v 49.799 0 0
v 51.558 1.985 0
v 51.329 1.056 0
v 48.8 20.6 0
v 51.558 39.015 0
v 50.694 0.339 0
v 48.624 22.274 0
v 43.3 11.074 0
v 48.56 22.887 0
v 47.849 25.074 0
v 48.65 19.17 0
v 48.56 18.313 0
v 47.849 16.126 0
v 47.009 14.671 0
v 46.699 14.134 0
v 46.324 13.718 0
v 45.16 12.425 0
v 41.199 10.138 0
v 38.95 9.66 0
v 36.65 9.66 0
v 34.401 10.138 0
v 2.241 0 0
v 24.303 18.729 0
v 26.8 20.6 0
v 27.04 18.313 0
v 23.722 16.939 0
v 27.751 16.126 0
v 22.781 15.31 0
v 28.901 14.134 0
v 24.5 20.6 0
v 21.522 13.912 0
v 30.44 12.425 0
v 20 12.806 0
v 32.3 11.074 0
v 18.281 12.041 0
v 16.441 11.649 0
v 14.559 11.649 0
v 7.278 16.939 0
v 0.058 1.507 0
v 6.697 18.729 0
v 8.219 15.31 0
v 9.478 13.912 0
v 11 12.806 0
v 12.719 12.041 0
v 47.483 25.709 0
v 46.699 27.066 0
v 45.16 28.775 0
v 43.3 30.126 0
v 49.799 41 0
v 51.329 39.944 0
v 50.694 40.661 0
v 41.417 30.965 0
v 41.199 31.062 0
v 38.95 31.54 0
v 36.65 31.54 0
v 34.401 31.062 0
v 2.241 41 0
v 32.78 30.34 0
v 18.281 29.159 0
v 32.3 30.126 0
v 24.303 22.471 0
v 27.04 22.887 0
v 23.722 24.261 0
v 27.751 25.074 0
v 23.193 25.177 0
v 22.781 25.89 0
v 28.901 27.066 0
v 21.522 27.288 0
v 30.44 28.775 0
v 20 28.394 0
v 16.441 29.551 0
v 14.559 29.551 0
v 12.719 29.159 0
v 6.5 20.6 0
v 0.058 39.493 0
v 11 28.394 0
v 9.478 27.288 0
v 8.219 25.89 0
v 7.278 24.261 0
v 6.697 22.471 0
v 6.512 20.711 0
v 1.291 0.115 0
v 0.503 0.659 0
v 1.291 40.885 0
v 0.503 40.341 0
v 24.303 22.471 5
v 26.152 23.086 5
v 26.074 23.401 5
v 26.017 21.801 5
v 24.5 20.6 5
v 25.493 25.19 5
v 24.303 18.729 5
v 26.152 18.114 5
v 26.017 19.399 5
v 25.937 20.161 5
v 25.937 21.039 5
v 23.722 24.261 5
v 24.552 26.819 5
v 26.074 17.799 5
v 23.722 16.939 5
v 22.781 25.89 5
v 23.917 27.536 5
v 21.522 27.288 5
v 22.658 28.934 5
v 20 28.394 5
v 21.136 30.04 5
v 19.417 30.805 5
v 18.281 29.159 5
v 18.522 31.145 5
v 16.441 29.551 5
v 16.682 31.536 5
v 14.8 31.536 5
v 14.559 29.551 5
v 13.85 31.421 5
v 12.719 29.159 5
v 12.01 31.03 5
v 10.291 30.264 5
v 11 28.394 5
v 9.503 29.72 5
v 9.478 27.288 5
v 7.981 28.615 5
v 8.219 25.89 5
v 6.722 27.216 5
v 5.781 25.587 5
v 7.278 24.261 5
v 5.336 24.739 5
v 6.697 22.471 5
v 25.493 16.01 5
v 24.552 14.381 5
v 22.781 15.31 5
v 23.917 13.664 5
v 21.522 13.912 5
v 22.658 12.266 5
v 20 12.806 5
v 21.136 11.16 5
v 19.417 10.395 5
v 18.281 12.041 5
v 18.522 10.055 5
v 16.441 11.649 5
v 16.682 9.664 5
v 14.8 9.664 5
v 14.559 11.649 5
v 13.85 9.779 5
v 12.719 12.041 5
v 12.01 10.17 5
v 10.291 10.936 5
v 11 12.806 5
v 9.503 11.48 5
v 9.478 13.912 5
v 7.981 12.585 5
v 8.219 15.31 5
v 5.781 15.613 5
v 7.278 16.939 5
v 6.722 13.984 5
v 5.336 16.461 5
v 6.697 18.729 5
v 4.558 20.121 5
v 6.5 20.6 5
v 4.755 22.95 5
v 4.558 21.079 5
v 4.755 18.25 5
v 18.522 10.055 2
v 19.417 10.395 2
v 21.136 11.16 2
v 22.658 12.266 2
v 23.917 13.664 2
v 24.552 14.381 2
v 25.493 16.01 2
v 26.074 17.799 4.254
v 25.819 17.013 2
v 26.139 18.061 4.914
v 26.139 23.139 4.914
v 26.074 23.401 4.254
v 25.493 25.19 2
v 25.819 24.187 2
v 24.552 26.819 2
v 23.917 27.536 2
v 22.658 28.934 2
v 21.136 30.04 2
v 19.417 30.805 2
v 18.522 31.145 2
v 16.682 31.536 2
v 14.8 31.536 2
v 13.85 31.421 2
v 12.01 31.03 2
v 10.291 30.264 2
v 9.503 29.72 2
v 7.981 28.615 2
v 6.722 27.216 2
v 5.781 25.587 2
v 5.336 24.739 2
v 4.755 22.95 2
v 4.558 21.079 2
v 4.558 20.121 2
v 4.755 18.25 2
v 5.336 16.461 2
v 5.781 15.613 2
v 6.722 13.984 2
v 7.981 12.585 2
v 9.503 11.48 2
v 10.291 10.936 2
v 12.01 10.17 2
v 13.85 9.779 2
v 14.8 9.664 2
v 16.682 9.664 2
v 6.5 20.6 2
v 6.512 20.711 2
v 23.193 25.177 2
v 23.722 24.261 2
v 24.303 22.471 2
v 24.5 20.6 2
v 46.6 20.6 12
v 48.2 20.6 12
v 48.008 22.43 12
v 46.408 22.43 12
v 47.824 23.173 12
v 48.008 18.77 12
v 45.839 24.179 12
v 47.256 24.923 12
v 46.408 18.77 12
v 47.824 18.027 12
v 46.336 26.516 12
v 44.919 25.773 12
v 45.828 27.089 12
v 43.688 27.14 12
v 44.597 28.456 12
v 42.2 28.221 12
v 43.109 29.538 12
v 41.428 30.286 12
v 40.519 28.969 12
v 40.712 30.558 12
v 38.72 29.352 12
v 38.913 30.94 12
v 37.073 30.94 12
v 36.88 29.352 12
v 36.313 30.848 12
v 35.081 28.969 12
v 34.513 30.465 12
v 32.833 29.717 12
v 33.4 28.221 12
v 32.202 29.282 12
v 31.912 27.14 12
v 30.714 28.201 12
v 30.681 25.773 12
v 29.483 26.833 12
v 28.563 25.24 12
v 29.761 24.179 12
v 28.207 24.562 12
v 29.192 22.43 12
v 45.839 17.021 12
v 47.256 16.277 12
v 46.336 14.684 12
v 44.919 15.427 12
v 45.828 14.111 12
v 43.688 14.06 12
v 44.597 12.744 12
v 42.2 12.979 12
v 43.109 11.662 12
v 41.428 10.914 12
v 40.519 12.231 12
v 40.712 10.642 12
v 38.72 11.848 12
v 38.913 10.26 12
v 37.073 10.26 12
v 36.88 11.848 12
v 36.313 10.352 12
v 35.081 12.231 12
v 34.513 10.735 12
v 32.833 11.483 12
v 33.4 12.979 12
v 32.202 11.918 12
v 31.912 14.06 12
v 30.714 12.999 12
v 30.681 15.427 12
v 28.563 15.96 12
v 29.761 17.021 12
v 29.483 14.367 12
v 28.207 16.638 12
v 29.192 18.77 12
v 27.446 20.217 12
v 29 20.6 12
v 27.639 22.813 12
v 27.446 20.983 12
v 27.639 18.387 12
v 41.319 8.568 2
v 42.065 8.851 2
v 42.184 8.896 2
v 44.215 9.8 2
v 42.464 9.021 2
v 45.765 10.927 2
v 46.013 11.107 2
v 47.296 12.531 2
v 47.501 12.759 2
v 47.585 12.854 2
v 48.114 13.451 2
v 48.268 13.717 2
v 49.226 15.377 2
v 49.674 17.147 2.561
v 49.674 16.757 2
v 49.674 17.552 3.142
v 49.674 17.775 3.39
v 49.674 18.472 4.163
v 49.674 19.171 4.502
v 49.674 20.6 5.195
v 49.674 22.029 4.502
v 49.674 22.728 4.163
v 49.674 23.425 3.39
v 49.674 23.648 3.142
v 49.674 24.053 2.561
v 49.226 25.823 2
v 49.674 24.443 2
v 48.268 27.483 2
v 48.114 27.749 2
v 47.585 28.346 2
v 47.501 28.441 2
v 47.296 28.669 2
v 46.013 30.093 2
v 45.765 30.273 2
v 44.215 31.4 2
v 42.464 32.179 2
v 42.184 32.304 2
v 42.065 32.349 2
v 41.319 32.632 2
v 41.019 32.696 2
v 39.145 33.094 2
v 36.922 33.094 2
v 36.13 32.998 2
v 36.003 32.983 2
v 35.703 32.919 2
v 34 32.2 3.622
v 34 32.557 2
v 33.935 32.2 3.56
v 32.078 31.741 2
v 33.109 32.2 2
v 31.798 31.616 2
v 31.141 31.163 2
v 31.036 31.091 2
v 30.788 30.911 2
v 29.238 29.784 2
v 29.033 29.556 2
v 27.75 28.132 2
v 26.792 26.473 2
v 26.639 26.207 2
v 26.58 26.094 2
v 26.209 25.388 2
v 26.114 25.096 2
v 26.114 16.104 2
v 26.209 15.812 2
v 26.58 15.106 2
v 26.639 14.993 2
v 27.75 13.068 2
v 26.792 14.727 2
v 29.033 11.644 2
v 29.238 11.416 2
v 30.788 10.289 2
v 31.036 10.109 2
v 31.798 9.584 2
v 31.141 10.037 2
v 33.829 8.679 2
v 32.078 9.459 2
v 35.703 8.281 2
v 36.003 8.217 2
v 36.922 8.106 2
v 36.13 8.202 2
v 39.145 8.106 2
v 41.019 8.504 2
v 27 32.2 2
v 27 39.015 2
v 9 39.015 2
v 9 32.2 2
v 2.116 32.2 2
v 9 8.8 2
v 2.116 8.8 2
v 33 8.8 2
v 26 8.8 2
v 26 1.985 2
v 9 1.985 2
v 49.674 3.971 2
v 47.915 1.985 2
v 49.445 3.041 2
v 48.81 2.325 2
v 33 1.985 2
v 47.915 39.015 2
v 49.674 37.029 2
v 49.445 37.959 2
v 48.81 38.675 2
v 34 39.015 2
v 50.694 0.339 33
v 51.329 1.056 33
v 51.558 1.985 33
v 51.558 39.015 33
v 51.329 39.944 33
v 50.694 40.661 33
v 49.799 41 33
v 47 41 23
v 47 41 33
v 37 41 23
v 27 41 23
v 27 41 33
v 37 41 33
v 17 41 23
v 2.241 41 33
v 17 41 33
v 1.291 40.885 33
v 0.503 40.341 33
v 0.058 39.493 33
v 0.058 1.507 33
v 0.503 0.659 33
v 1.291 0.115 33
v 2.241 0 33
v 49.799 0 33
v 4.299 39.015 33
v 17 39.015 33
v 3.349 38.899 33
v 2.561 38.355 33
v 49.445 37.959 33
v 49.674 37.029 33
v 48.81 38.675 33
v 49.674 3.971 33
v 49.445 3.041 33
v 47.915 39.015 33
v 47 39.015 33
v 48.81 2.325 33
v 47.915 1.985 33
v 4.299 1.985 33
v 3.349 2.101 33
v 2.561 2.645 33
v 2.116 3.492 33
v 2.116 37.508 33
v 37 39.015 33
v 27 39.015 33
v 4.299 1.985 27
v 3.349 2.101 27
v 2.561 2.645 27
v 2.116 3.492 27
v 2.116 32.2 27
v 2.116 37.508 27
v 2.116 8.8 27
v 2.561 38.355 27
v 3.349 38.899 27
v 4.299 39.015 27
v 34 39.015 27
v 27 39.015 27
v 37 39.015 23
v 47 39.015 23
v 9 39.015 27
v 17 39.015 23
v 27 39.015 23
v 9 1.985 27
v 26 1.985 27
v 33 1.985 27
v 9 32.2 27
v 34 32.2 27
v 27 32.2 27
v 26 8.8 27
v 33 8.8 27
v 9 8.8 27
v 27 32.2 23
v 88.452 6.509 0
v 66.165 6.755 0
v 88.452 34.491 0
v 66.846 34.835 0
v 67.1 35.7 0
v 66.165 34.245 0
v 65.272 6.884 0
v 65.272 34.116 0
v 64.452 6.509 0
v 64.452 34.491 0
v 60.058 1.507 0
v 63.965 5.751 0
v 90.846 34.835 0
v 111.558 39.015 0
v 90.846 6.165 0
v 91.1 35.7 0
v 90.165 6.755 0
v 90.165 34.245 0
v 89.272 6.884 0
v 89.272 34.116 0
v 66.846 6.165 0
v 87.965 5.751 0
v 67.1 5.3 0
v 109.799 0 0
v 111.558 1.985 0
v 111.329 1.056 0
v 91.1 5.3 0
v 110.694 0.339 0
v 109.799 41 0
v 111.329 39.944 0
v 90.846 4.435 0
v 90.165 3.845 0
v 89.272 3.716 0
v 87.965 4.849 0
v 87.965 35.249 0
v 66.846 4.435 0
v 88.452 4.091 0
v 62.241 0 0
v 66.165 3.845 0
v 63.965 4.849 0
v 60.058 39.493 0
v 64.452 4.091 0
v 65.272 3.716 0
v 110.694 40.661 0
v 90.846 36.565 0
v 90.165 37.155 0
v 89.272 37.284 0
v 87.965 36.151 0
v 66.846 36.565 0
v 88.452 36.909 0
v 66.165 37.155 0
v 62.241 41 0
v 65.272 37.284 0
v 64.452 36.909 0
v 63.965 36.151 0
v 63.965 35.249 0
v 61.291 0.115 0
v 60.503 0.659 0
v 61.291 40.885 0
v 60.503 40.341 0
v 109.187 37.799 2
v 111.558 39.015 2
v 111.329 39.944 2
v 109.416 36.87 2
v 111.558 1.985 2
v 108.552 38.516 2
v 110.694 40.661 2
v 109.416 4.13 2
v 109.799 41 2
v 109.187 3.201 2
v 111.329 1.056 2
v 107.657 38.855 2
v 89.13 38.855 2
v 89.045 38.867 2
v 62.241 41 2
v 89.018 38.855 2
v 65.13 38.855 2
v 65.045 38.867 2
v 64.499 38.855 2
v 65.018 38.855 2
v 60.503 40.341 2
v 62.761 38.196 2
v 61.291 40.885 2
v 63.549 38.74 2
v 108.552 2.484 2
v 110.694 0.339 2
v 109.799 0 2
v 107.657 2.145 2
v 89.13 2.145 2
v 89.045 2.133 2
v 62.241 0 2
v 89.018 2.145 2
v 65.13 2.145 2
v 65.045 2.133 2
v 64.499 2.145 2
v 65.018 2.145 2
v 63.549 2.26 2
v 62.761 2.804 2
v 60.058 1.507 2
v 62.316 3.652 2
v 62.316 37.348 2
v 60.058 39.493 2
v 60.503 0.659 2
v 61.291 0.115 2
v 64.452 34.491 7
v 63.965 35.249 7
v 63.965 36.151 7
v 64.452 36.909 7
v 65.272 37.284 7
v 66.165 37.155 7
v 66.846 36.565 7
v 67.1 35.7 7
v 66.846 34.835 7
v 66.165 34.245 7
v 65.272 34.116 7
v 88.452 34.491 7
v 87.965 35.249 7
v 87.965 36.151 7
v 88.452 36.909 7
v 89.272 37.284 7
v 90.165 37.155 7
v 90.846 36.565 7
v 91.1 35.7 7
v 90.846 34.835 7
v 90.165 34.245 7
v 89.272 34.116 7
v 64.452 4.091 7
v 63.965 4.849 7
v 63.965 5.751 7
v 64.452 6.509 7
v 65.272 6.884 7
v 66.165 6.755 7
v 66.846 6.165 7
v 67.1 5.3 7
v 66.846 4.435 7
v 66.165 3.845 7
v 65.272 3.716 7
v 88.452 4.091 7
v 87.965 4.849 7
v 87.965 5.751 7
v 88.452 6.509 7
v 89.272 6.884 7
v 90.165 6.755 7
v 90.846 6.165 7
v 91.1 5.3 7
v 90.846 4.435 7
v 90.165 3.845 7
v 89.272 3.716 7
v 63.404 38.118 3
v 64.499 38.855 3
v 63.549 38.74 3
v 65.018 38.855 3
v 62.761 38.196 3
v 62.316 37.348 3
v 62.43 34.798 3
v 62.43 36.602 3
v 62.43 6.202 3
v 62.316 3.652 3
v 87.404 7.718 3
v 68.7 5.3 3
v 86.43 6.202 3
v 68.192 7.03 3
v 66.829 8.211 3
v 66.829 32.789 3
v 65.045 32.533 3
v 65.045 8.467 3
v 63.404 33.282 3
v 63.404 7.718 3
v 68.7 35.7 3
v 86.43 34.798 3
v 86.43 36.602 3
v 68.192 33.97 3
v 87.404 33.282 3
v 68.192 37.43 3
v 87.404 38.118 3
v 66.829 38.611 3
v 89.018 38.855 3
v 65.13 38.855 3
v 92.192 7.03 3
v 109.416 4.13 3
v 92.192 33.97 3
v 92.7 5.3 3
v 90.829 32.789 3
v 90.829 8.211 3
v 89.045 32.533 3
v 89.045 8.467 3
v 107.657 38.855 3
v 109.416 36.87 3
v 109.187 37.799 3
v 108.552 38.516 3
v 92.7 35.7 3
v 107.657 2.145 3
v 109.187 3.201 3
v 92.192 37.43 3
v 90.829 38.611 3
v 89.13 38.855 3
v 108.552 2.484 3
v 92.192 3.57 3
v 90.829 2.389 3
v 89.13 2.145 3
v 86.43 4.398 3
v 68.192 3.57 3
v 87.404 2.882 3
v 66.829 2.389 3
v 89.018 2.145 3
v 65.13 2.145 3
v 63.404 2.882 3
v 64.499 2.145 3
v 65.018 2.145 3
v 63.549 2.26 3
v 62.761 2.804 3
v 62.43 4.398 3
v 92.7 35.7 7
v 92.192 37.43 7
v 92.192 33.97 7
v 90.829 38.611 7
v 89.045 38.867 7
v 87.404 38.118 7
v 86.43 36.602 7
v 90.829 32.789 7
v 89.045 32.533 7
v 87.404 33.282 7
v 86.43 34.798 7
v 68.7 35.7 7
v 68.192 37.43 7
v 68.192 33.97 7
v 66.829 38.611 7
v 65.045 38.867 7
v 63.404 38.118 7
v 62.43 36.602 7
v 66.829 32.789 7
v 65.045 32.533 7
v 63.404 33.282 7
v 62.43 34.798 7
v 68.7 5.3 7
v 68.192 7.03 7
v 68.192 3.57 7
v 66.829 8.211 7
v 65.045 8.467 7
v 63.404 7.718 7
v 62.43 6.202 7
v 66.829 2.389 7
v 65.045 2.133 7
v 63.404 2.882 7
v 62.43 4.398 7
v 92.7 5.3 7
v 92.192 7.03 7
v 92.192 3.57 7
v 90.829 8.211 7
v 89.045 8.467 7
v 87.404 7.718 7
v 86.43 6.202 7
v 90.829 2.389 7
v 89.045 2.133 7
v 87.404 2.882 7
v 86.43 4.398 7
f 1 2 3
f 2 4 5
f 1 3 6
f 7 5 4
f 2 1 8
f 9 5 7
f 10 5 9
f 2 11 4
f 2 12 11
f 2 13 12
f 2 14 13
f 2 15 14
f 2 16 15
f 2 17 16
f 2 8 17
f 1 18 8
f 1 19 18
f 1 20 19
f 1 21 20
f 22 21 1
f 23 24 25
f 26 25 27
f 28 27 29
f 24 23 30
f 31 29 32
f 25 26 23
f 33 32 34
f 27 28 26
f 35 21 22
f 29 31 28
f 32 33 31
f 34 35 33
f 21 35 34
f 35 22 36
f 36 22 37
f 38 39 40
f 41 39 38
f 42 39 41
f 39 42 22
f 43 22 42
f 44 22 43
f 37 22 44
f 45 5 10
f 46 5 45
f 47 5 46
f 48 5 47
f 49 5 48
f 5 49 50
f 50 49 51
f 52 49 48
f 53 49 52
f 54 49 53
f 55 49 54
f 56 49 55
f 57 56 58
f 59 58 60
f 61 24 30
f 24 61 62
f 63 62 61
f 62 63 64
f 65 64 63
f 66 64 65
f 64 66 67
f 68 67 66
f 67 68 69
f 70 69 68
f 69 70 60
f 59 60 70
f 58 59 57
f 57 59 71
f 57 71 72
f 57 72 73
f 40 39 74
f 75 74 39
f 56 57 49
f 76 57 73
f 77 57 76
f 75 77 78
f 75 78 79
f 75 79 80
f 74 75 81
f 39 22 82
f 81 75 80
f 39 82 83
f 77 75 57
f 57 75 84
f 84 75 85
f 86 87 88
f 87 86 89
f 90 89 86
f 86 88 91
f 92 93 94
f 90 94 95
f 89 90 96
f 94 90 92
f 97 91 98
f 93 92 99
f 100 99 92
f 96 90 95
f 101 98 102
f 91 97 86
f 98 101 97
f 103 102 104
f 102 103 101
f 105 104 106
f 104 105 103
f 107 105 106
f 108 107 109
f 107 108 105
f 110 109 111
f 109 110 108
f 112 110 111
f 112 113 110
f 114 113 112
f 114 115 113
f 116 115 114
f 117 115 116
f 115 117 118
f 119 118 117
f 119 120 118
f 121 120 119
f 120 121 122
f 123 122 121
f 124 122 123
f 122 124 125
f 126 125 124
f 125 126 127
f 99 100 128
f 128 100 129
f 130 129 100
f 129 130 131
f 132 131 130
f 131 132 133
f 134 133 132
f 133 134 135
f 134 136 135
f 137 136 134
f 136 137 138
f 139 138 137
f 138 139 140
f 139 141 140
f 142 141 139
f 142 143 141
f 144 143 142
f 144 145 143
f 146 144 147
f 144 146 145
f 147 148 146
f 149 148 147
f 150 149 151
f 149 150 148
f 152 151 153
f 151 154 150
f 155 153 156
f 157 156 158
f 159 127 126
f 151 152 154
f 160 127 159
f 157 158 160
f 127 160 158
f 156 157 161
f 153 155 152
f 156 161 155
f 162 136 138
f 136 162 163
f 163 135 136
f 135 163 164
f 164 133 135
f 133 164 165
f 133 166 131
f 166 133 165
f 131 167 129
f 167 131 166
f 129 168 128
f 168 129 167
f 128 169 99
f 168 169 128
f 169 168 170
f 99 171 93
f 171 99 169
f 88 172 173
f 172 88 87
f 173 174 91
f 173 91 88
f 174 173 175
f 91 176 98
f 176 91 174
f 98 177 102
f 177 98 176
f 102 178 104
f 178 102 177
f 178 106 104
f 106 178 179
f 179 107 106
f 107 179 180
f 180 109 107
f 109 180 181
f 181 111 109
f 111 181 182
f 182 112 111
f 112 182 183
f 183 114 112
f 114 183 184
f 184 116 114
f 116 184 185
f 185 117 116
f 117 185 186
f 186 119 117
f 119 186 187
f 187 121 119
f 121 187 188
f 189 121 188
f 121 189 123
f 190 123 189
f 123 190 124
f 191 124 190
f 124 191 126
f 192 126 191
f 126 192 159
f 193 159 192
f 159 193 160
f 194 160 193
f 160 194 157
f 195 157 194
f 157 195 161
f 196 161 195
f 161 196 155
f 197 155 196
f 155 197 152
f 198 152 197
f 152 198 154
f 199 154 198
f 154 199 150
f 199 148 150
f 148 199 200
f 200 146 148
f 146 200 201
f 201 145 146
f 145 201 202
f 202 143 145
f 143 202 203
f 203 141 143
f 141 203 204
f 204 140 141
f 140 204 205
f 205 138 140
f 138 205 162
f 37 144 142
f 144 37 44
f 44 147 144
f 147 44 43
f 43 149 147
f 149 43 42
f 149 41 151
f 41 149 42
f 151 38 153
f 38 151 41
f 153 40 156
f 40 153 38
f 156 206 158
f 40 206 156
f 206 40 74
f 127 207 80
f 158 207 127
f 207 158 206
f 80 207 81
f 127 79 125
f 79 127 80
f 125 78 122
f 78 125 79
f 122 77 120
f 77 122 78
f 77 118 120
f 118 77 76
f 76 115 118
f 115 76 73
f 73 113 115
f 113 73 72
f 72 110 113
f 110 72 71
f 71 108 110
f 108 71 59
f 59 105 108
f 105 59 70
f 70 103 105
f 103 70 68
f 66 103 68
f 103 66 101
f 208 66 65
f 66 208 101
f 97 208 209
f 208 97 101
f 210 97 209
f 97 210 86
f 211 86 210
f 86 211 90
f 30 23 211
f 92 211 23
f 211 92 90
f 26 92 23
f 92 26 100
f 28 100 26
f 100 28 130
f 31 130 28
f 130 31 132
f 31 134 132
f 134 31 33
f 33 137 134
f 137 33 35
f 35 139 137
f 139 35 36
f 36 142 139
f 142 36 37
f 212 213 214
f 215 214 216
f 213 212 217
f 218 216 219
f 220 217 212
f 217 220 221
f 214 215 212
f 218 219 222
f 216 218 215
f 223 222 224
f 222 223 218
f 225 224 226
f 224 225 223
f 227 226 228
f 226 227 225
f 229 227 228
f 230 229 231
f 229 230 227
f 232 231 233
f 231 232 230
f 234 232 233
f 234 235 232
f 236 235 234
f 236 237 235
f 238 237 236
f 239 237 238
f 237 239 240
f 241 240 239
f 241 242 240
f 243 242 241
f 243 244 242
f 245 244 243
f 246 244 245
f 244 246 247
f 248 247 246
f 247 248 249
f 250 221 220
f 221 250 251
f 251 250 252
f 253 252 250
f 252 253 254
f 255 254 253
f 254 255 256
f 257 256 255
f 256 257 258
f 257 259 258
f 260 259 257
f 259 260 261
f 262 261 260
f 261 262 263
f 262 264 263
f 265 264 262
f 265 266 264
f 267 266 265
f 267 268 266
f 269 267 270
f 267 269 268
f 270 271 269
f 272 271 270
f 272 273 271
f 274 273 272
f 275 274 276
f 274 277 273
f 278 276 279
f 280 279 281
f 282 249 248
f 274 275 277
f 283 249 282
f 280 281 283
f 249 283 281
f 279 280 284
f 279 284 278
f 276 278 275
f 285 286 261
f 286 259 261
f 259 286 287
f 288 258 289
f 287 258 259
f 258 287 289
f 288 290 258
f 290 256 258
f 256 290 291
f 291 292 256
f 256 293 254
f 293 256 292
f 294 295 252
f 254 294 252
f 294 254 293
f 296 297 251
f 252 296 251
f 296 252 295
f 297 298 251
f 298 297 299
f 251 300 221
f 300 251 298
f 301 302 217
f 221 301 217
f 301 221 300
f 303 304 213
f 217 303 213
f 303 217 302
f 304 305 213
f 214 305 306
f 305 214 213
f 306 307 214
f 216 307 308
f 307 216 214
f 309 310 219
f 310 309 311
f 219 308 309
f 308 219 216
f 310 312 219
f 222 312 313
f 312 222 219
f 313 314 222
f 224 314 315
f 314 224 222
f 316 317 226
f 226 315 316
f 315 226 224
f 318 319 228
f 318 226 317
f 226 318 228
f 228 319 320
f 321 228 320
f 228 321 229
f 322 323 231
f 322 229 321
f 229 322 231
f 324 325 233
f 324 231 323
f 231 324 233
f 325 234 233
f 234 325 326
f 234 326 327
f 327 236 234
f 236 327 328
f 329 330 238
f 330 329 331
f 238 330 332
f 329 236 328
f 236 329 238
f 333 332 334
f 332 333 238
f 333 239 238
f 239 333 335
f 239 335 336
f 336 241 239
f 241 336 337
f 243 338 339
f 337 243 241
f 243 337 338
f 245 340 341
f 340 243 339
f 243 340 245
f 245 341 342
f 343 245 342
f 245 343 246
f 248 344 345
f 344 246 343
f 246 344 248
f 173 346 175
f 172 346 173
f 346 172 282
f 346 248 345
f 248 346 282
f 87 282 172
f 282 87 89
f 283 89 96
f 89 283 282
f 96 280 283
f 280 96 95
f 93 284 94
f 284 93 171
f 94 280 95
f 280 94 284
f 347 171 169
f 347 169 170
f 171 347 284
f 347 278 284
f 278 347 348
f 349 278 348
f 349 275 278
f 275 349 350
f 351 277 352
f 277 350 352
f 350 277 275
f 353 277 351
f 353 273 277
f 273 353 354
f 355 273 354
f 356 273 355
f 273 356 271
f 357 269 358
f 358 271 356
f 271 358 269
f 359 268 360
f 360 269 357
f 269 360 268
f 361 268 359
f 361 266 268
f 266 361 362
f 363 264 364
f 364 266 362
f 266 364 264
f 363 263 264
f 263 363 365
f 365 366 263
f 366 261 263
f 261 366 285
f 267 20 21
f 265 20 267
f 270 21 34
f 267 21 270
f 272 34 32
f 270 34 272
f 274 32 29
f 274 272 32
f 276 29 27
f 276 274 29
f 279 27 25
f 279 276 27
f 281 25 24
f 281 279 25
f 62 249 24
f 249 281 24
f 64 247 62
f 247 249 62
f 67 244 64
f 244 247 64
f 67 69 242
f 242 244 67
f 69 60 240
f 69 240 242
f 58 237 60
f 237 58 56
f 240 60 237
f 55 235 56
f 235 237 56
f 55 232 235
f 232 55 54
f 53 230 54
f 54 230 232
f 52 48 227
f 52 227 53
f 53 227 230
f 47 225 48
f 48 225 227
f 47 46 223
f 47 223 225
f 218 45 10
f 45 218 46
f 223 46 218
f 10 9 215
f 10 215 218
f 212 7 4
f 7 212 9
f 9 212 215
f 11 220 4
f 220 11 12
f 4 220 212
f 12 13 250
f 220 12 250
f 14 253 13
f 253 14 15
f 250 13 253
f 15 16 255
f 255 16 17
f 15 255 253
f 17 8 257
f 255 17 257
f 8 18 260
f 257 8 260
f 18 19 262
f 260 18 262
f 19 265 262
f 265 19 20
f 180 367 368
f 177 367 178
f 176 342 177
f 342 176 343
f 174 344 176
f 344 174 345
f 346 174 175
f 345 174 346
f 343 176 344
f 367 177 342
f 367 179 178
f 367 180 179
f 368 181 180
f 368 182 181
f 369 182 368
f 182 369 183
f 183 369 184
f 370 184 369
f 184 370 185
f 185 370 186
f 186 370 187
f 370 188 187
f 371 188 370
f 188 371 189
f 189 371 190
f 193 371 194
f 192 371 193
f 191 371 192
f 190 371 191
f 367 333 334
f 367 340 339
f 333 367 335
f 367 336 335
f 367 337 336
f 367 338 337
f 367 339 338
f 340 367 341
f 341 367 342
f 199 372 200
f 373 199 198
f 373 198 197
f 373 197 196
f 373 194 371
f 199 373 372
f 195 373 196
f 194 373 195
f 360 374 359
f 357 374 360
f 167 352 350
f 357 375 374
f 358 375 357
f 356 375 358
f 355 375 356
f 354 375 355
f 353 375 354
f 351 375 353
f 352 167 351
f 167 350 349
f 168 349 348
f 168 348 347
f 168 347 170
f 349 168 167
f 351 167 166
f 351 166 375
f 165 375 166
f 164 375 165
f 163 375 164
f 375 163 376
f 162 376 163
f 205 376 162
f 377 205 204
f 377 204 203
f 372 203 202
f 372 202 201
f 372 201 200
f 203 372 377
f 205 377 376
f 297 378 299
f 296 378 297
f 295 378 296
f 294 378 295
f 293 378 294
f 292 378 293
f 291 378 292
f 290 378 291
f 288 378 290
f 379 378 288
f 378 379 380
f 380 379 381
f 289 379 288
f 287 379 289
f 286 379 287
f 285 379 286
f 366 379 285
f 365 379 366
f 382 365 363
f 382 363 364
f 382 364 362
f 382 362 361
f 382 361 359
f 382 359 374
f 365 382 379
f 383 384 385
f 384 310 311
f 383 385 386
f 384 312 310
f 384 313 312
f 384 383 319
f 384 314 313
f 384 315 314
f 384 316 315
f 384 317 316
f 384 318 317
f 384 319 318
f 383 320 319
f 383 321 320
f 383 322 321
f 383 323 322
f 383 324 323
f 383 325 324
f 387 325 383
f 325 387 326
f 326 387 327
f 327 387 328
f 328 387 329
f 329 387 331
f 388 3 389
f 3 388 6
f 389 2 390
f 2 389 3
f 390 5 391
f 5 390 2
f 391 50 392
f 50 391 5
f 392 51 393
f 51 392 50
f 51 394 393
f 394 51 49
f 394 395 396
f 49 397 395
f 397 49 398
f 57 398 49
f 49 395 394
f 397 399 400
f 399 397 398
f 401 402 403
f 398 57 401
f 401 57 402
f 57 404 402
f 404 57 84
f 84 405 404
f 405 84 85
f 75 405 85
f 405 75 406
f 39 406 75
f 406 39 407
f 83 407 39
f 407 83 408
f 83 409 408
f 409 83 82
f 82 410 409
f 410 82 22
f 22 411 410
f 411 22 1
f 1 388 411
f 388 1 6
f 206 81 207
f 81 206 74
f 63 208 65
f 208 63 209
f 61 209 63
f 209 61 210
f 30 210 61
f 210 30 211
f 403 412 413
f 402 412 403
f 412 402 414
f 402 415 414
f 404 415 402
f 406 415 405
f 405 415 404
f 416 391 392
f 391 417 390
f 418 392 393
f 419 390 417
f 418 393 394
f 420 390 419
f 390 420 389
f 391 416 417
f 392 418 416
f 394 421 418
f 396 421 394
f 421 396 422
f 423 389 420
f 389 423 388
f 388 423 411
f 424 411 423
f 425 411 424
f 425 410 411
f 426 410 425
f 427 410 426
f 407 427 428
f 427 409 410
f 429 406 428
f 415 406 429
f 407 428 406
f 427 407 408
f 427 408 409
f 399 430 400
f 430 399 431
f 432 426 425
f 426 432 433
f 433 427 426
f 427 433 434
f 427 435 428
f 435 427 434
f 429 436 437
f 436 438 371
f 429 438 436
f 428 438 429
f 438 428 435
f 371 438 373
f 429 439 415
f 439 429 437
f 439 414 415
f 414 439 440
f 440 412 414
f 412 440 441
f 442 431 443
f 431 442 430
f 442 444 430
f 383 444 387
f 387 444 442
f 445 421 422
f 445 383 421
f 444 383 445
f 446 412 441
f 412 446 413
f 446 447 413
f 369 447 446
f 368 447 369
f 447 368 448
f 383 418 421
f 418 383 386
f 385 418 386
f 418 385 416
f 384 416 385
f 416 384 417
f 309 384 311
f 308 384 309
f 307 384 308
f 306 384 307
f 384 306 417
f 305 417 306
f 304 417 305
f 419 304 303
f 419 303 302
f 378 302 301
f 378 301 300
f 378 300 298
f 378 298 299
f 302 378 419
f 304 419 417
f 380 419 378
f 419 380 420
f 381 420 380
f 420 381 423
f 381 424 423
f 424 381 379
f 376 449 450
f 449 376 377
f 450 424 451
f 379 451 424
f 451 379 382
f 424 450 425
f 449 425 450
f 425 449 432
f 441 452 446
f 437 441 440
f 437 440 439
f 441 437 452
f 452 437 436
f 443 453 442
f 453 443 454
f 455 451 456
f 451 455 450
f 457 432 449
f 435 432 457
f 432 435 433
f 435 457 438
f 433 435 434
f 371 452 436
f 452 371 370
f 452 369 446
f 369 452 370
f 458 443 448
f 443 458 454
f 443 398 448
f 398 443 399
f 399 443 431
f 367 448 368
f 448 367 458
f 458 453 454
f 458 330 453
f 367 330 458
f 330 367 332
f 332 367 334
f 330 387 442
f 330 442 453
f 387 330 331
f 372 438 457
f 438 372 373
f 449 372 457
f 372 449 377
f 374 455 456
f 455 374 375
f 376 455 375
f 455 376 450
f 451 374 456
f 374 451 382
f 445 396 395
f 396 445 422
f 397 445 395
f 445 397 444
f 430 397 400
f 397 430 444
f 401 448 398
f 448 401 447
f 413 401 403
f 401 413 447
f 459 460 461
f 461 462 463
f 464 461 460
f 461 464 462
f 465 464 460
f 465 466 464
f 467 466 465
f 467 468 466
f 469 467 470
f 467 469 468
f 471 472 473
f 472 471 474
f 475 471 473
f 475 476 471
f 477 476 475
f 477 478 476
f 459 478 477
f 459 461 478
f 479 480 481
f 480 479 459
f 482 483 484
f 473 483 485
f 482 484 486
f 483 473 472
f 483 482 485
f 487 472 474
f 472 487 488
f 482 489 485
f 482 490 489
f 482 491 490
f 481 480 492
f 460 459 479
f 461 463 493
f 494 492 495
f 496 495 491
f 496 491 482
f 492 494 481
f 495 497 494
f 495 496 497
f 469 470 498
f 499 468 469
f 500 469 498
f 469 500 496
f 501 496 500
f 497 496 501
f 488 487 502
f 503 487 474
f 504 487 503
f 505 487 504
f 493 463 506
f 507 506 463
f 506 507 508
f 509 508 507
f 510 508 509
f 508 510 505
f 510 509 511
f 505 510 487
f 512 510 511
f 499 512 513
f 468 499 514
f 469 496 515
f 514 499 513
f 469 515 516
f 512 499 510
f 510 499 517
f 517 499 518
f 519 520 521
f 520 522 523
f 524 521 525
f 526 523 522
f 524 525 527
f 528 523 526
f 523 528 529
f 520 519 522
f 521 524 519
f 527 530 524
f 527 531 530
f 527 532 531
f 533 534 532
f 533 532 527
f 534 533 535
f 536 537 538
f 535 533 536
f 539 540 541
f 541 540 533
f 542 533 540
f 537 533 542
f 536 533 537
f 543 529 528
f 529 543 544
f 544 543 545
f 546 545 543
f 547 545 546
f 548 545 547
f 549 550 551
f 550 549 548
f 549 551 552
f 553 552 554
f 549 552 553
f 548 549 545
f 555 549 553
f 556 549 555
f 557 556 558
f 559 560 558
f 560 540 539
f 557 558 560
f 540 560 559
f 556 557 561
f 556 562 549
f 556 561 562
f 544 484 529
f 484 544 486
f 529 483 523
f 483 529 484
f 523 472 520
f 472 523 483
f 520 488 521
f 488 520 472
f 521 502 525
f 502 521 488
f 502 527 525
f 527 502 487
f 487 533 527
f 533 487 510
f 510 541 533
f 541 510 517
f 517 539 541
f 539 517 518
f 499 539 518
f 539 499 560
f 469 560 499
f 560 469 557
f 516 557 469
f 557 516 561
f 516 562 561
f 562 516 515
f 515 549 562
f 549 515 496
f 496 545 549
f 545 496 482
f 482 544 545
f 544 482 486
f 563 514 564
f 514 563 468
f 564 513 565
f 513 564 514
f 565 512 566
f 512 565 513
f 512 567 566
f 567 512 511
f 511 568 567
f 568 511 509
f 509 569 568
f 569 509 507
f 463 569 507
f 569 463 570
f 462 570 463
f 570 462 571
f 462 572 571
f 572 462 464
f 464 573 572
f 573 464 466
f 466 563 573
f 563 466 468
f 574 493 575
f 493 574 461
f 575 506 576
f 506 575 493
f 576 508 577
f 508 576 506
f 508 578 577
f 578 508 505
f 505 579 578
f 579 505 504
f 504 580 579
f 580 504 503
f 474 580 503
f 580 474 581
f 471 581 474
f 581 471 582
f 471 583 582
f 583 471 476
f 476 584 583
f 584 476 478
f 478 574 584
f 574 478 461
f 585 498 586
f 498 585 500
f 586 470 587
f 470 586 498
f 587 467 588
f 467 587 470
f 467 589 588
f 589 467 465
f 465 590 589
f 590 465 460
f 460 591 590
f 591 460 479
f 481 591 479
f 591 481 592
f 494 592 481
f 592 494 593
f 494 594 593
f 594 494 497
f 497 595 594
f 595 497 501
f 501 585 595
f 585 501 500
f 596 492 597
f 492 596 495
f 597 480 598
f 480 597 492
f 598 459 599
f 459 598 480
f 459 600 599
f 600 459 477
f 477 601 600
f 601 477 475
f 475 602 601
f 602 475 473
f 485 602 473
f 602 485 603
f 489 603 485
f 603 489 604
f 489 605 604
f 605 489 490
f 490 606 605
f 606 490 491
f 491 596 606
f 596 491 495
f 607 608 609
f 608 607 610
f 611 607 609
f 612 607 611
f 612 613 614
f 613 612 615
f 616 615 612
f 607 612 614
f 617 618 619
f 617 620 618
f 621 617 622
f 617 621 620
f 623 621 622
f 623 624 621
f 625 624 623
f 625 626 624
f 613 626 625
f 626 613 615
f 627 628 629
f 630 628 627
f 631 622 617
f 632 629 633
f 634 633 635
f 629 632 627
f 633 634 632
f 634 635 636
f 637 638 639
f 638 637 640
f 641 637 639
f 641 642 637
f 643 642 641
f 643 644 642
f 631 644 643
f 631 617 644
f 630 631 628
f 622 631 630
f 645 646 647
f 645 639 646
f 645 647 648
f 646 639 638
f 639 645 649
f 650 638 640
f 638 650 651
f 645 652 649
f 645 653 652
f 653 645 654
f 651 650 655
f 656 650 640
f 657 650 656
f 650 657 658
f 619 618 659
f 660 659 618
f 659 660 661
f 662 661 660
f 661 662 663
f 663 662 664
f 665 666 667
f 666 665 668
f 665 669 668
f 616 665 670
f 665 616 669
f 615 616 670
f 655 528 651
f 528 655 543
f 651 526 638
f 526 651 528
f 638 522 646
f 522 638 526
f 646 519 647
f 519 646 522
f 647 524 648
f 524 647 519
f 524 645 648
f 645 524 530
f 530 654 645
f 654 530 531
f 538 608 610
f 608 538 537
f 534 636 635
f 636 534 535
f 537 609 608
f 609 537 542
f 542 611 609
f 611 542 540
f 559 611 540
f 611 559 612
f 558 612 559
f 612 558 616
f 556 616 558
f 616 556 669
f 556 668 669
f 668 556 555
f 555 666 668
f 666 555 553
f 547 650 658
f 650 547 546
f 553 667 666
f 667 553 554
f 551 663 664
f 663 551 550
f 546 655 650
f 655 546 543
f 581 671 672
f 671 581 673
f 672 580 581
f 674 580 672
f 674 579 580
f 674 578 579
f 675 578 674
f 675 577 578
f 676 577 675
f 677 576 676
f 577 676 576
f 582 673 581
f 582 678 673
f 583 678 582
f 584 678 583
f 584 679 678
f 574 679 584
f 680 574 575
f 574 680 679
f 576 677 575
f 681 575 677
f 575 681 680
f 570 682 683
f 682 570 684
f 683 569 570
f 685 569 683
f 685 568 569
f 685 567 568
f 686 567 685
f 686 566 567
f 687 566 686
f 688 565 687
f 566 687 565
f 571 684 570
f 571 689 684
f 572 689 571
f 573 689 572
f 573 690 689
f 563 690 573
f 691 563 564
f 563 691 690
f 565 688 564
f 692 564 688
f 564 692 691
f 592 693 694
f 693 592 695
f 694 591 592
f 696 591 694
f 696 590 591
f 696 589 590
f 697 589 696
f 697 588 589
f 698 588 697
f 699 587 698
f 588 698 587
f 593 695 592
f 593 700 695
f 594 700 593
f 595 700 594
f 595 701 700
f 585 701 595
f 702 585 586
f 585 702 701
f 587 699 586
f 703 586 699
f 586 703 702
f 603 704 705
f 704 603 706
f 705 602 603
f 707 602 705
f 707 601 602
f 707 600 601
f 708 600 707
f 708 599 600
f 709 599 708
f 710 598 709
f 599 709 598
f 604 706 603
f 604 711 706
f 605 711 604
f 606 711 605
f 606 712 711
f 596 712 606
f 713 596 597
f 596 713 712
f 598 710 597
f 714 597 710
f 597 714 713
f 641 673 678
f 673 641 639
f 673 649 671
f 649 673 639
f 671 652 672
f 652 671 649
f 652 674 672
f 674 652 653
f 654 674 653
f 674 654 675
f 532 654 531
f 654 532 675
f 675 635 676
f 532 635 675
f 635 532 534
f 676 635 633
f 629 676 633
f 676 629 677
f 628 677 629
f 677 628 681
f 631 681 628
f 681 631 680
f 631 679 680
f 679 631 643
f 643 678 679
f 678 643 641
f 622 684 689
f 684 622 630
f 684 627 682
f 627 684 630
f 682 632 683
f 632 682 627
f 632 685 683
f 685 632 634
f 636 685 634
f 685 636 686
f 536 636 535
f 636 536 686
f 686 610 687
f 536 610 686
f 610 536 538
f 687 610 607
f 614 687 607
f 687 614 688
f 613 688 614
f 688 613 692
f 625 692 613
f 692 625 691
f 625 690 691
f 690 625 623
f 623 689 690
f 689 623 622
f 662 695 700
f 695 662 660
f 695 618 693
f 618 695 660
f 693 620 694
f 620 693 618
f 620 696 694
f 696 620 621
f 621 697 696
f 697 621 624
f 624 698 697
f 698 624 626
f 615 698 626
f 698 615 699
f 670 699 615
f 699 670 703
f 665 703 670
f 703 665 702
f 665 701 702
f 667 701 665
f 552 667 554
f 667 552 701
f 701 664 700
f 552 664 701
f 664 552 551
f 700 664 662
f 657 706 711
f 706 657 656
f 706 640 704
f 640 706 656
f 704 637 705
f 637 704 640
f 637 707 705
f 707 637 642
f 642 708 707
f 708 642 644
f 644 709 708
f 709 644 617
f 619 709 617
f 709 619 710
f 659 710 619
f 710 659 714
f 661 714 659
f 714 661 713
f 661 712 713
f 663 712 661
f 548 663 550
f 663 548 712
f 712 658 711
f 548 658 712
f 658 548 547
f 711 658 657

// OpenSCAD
r_fillet = 2; // radius of fillets
t = 2; // thickness of case
$fs = 1;
board_width=35;
board_length = 45.5;
board_height = 21;
r_hole = 1.6;
sep = t + 1; // separation of outer wall of case from board

*color("green") translate([sep, sep, 28.5 + sep]) rotate([-90, 0, 0]) import("PX4Flow.STL", convexity=5);
case_width = board_width + sep*2;
case_length = board_length + sep*2;

module outset(r) {
    minkowski() {
        circle(r=r);
        children();
    }
}

module inverse() {
	difference() {
		square(1e5,center=true);
		children();
	}
}

module fillet(r=1) {
	inset(r=r) render() outset(r=r) children();
}

module rounding(r=1) {
	outset(r=r) inset(r=r) children();
}

module inset(r) {
    inverse() outset(r) inverse() children();
}

module mount_holes() {
    translate([sep, sep]) union() {
        translate([2.5, 2.3]) circle(r_hole);
        translate([2.5, 32.7]) circle(r_hole);
        translate([26.5, 32.7]) circle(r_hole);
        translate([26.5, 2.3]) circle(r_hole);
    }
}

module mount_supports() {
    linear_extrude(27) translate([sep, sep]) union() {
        d = 2  + sep + t;
        translate([2.5, 2.3]) square([d, d], center=true);
        translate([2.5, 32.7]) square([d, d], center=true);
        translate([27.5, 32.7]) square([d, d], center=true);
        translate([26.5, 2.3]) square([d, d], center=true);
    }
}

module sensor_holes() {
    translate([sep, sep]) union() {
        translate([12.5, 17.6]) circle(9);
        translate([34.8, 17.6]) circle(11);
    }
}

module sensor_cowlings() {
    translate([sep, sep]) union() {
        translate([12.5, 17.6]) linear_extrude(5, scale=1) difference() {
            outset(t) circle(9);
            circle(9);
        }
        translate([34.8, 17.6 ]) linear_extrude(12, scale=0.8) difference() {
            outset(t) circle(11);
            circle(11);
        }
    }
}

module base() {
    rounding(r_fillet) square([case_length, case_width]);
}

module side() {
    linear_extrude(board_height + 2*sep + 6) difference() {
        base();
        rounding(r_fillet) inset(t) base();
    }
}

module bottom_plate() {
    linear_extrude(t) difference() {
        base();
        sensor_holes();
    }
}

module top_plate() {
    union() {
        linear_extrude(t) difference() {
            base();
            mount_holes();
        }
        linear_extrude(t*1.5) difference() {
            rounding(r_fillet) inset(t + 0.2) base();
            mount_holes();
        }
        linear_extrude(7) difference() {
            outset(1.6) mount_holes();
            mount_holes();
        }
    }
}

module access_ports() {
    translate([37, 32, 23]) cube([10, 10, 50]);
    translate([17, 32, 23]) cube([10, 10, 50]);
}

module bottom_case() {
    render() difference() {
        union() {
            bottom_plate();
            side();
            mount_supports();
            sensor_cowlings();
        }
        access_ports();
    }
}

bottom_case();
//color("blue") translate([0, case_width, 35]) rotate([180, 0, 0]) top_plate();
translate([60, 0, 0]) top_plate();
